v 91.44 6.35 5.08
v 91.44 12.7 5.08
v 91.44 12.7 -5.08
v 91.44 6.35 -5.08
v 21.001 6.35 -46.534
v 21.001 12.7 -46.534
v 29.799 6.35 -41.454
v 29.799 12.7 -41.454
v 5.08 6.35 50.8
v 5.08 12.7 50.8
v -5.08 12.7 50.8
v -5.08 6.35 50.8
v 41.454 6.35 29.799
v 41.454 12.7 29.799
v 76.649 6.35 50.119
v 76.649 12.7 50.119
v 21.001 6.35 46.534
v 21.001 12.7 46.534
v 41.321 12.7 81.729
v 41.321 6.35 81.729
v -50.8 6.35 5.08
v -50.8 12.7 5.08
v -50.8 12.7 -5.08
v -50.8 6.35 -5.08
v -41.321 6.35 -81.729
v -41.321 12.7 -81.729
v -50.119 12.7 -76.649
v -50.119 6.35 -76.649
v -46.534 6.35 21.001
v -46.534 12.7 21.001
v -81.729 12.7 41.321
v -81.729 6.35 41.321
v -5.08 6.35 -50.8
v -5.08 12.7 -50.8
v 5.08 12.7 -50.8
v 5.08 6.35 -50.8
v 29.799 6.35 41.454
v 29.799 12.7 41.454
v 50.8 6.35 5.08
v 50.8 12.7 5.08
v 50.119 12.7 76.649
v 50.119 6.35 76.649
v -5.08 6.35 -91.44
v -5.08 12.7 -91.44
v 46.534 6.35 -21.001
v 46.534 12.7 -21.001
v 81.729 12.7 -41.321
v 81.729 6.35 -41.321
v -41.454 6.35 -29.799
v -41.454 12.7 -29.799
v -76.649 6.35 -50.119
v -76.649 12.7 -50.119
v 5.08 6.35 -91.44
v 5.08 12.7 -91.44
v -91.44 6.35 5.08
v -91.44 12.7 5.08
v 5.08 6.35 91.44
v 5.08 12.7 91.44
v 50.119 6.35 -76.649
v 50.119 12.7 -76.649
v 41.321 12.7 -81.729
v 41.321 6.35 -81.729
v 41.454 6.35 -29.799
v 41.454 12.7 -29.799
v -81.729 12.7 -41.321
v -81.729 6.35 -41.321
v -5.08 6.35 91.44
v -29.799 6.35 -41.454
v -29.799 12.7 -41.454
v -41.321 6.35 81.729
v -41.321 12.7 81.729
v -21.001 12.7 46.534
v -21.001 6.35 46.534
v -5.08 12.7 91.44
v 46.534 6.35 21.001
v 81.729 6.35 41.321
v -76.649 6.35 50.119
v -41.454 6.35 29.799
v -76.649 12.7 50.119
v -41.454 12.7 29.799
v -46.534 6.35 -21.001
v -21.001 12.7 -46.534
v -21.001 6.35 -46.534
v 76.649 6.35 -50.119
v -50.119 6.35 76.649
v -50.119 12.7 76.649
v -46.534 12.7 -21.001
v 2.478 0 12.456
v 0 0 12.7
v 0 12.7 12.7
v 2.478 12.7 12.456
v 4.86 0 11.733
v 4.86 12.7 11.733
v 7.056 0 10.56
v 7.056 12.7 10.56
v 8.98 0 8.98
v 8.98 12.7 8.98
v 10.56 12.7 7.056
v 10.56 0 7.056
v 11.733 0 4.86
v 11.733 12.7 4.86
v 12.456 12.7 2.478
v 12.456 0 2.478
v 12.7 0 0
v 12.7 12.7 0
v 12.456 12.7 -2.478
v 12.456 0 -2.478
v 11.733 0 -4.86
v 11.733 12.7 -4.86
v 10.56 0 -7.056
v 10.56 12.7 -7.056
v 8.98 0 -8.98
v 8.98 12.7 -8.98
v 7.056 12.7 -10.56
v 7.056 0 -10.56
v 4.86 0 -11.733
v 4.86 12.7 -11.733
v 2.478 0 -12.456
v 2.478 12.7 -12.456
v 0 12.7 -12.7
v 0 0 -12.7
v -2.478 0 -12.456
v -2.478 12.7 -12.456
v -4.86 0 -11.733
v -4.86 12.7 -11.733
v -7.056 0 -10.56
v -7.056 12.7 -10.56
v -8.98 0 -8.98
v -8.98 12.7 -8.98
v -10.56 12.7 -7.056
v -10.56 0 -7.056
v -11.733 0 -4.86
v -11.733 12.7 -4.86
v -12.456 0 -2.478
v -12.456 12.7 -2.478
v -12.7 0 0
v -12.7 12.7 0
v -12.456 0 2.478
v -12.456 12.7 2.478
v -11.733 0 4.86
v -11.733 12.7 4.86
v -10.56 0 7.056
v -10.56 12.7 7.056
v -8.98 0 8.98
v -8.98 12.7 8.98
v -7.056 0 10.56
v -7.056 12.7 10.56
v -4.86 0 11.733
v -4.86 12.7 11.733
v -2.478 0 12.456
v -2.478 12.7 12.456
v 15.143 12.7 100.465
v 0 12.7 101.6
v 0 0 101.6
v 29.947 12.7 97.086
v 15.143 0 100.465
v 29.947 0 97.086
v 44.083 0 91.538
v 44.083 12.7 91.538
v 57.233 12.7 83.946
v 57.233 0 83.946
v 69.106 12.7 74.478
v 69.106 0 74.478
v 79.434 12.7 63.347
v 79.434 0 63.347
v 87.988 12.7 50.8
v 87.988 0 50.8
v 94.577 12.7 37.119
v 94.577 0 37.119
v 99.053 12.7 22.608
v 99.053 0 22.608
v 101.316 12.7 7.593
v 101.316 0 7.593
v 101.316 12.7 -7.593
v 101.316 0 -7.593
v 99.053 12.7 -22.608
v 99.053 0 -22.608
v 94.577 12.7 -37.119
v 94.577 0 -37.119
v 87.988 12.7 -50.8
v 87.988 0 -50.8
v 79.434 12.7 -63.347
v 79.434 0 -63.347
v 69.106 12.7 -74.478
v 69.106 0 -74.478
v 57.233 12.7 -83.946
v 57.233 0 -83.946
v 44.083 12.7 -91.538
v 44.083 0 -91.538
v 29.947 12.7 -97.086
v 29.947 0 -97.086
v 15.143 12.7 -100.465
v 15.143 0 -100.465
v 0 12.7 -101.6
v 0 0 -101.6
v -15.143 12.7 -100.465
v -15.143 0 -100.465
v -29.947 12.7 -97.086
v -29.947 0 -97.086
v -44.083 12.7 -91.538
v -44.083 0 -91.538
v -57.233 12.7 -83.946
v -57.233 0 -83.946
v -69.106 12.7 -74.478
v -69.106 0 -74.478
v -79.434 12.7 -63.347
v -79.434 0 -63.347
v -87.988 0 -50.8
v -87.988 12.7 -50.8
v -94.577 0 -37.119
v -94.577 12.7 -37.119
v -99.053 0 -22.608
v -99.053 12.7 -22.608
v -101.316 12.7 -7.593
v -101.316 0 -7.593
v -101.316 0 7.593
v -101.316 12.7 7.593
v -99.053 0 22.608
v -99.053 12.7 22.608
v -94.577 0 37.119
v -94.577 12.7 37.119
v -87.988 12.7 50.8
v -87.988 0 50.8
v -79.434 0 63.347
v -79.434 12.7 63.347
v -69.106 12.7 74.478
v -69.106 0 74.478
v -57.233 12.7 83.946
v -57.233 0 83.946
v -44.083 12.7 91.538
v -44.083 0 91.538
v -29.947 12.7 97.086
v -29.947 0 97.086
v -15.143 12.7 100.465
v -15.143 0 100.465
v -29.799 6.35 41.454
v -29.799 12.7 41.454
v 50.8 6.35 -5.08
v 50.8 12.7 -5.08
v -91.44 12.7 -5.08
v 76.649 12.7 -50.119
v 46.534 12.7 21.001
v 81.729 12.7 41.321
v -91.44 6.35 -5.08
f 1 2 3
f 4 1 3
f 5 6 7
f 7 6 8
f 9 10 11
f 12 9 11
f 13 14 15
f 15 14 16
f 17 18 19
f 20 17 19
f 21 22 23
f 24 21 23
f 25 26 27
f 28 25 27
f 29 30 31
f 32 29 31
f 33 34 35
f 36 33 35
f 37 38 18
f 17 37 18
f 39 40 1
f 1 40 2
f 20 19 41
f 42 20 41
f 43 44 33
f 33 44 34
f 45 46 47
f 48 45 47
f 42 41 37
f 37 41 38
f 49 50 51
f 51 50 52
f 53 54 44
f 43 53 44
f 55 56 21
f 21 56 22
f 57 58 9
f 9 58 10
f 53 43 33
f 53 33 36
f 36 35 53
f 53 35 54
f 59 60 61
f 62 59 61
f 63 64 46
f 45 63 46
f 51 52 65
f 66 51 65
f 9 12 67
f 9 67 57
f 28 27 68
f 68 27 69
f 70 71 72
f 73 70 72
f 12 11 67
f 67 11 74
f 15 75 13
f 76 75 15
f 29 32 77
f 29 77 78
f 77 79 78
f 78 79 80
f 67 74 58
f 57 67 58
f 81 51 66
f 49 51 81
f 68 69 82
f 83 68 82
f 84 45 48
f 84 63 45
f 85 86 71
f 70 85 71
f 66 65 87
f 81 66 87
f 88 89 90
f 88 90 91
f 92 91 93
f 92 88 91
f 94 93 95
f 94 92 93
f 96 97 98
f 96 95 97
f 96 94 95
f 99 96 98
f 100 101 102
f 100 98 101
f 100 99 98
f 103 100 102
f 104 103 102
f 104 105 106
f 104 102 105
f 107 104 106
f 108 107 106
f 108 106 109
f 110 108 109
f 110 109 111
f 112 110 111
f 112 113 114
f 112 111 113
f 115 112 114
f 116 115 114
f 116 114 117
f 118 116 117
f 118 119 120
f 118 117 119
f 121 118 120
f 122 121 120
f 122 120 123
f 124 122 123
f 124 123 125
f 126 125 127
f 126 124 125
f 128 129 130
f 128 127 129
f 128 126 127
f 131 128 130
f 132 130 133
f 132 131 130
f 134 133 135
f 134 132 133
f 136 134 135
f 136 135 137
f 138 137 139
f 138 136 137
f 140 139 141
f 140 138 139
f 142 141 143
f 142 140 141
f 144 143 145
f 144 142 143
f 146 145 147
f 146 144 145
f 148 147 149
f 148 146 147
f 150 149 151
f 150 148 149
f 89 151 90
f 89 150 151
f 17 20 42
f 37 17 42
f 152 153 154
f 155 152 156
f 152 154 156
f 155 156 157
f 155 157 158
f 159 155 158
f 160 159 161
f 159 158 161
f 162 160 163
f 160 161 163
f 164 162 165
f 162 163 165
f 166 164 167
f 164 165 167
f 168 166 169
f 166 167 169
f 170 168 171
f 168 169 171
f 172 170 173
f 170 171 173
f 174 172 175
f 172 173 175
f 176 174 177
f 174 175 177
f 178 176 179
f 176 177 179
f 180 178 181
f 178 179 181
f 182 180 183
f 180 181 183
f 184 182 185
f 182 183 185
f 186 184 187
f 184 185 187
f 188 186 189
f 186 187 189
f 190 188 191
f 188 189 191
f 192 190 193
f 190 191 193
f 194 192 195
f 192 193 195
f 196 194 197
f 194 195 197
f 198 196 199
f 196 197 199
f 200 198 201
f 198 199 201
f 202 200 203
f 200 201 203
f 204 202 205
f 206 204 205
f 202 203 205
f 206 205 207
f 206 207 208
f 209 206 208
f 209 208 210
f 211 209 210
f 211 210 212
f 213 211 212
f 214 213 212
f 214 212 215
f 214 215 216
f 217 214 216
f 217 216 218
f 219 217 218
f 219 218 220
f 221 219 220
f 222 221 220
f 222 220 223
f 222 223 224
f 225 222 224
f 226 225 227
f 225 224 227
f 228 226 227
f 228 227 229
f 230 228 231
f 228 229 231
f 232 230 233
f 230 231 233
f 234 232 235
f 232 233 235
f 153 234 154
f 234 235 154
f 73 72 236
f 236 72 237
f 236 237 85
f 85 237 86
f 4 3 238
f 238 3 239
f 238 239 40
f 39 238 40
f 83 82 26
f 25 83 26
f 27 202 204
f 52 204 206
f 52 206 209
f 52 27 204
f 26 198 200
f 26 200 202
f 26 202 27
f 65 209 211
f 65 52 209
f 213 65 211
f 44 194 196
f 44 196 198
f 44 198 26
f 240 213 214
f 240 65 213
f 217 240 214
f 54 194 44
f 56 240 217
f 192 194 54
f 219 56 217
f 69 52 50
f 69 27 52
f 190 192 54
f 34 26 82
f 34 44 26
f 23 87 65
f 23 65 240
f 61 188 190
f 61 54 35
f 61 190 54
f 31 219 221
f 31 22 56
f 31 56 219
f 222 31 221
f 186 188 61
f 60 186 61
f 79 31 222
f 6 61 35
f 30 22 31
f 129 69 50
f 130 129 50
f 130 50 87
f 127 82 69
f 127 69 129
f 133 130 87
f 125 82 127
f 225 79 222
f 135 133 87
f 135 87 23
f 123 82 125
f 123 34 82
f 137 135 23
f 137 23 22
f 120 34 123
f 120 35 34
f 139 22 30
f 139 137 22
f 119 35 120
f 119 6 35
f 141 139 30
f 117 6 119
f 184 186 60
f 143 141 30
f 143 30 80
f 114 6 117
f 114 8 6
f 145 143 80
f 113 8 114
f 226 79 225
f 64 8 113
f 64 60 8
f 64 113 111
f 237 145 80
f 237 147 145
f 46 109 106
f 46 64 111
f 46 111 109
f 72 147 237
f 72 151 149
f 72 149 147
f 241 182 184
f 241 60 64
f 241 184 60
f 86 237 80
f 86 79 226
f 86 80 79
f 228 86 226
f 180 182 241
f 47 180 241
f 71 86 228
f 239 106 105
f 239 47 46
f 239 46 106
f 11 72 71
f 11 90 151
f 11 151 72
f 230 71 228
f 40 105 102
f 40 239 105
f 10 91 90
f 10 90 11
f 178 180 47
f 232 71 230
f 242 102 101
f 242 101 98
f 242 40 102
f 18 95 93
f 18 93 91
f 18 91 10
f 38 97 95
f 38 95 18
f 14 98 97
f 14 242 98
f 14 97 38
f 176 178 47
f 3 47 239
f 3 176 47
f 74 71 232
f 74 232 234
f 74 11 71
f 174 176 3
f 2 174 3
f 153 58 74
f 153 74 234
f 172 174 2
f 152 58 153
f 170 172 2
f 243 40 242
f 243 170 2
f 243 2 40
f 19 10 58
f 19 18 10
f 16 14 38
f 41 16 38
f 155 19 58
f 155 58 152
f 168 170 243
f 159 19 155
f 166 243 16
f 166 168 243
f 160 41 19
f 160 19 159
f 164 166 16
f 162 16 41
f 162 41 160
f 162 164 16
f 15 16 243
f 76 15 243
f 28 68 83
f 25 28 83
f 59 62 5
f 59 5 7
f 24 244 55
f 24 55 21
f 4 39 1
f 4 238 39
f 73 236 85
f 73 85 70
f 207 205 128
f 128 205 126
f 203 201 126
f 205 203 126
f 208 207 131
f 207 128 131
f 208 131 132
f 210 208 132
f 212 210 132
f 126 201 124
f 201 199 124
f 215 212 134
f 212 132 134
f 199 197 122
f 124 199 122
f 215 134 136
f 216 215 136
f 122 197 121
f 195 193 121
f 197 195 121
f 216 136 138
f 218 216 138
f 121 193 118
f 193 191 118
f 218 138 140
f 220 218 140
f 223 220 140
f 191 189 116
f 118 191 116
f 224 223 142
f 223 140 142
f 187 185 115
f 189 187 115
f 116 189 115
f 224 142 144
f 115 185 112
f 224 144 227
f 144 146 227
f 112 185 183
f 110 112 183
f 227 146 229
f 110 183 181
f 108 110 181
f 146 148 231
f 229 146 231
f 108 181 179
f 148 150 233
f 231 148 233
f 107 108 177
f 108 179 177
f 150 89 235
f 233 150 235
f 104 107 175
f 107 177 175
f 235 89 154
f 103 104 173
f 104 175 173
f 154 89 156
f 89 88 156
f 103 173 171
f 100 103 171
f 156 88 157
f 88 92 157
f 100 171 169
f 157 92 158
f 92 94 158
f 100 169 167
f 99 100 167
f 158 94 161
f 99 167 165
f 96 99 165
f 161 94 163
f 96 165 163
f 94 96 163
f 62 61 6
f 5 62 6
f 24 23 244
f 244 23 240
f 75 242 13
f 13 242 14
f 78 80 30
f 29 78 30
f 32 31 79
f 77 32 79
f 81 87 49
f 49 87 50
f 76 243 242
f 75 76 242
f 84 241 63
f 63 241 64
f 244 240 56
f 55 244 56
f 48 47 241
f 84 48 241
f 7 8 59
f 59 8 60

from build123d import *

# Parameters (mm, degrees)
SKETCH1_R               = 101.6
BOSS_EXTRUDE1_DEPTH     = 12.7
CUT_EXTRUDE1_DEPTH      = 6.35
CUT_EXTRUDE2_DEPTH      = 145.244271983
CUT_EXTRUDE2_DEPTH_BACK = 145.244271983
SKETCH3_R               = 12.7


with BuildPart() as part:
    # Sketch1 → Boss-Extrude1 (new body)
    with BuildSketch(Plane(origin=(0, 0, 0), x_dir=(1, 0, 0), z_dir=(0, 1, 0))):
        with Locations(Location((0, 0, 0), (0, 0, 270))):
            Circle(SKETCH1_R)
    extrude(amount=BOSS_EXTRUDE1_DEPTH)

    # Sketch2 → Cut-Extrude1 (cut)
    with BuildSketch(Plane(origin=(0, 12.7, 0), x_dir=(1, 0, 0), z_dir=(0, 1, 0))):
        Polygon((0, 50.8), (5.08, 50.8), (5.08, 91.44), (0, 91.44), (-5.08, 91.44), (-5.08, 50.8), align=None)
        Polygon((25.4, 43.994090512), (29.799409051, 41.454090512), (50.119409051, 76.649362922), (45.72, 79.189362922), (41.320590949, 81.729362922), (21.000590949, 46.534090512), align=None)
        Polygon((43.994090512, 25.4), (46.534090512, 21.000590949), (81.729362922, 41.320590949), (79.189362922, 45.72), (76.649362922, 50.119409051), (41.454090512, 29.799409051), align=None)
        Polygon((50.8, 0), (50.8, -5.08), (91.44, -5.08), (91.44, 0), (91.44, 5.08), (50.8, 5.08), align=None)
        Polygon((43.994090512, -25.4), (41.454090512, -29.799409051), (76.649362922, -50.119409051), (79.189362922, -45.72), (81.729362922, -41.320590949), (46.534090512, -21.000590949), align=None)
        Polygon((25.4, -43.994090512), (21.000590949, -46.534090512), (41.320590949, -81.729362922), (45.72, -79.189362922), (50.119409051, -76.649362922), (29.799409051, -41.454090512), align=None)
        Polygon((0, -50.8), (-5.08, -50.8), (-5.08, -91.44), (0, -91.44), (5.08, -91.44), (5.08, -50.8), align=None)
        Polygon((-25.4, -43.994090512), (-29.799409051, -41.454090512), (-50.119409051, -76.649362922), (-45.72, -79.189362922), (-41.320590949, -81.729362922), (-21.000590949, -46.534090512), align=None)
        Polygon((-43.994090512, -25.4), (-46.534090512, -21.000590949), (-81.729362922, -41.320590949), (-79.189362922, -45.72), (-76.649362922, -50.119409051), (-41.454090512, -29.799409051), align=None)
        Polygon((-50.8, 0), (-50.8, 5.08), (-91.44, 5.08), (-91.44, 0), (-91.44, -5.08), (-50.8, -5.08), align=None)
        Polygon((-43.994090512, 25.4), (-41.454090512, 29.799409051), (-76.649362922, 50.119409051), (-79.189362922, 45.72), (-81.729362922, 41.320590949), (-46.534090512, 21.000590949), align=None)
        Polygon((-25.4, 43.994090512), (-21.000590949, 46.534090512), (-41.320590949, 81.729362922), (-45.72, 79.189362922), (-50.119409051, 76.649362922), (-29.799409051, 41.454090512), align=None)
    extrude(amount=-CUT_EXTRUDE1_DEPTH, mode=Mode.SUBTRACT)

    # Sketch3 → Cut-Extrude2 (cut, two sides: drawn at the far end of the back side and taken through both)
    with BuildSketch(Plane(origin=(0, 12.7, 0), x_dir=(1, 0, 0), z_dir=(0, 1, 0)).offset(-CUT_EXTRUDE2_DEPTH_BACK)):
        with Locations(Location((0, 0, 0), (0, 0, 270))):
            Circle(SKETCH3_R)
    extrude(amount=CUT_EXTRUDE2_DEPTH + CUT_EXTRUDE2_DEPTH_BACK, mode=Mode.SUBTRACT)


solid = part.part
